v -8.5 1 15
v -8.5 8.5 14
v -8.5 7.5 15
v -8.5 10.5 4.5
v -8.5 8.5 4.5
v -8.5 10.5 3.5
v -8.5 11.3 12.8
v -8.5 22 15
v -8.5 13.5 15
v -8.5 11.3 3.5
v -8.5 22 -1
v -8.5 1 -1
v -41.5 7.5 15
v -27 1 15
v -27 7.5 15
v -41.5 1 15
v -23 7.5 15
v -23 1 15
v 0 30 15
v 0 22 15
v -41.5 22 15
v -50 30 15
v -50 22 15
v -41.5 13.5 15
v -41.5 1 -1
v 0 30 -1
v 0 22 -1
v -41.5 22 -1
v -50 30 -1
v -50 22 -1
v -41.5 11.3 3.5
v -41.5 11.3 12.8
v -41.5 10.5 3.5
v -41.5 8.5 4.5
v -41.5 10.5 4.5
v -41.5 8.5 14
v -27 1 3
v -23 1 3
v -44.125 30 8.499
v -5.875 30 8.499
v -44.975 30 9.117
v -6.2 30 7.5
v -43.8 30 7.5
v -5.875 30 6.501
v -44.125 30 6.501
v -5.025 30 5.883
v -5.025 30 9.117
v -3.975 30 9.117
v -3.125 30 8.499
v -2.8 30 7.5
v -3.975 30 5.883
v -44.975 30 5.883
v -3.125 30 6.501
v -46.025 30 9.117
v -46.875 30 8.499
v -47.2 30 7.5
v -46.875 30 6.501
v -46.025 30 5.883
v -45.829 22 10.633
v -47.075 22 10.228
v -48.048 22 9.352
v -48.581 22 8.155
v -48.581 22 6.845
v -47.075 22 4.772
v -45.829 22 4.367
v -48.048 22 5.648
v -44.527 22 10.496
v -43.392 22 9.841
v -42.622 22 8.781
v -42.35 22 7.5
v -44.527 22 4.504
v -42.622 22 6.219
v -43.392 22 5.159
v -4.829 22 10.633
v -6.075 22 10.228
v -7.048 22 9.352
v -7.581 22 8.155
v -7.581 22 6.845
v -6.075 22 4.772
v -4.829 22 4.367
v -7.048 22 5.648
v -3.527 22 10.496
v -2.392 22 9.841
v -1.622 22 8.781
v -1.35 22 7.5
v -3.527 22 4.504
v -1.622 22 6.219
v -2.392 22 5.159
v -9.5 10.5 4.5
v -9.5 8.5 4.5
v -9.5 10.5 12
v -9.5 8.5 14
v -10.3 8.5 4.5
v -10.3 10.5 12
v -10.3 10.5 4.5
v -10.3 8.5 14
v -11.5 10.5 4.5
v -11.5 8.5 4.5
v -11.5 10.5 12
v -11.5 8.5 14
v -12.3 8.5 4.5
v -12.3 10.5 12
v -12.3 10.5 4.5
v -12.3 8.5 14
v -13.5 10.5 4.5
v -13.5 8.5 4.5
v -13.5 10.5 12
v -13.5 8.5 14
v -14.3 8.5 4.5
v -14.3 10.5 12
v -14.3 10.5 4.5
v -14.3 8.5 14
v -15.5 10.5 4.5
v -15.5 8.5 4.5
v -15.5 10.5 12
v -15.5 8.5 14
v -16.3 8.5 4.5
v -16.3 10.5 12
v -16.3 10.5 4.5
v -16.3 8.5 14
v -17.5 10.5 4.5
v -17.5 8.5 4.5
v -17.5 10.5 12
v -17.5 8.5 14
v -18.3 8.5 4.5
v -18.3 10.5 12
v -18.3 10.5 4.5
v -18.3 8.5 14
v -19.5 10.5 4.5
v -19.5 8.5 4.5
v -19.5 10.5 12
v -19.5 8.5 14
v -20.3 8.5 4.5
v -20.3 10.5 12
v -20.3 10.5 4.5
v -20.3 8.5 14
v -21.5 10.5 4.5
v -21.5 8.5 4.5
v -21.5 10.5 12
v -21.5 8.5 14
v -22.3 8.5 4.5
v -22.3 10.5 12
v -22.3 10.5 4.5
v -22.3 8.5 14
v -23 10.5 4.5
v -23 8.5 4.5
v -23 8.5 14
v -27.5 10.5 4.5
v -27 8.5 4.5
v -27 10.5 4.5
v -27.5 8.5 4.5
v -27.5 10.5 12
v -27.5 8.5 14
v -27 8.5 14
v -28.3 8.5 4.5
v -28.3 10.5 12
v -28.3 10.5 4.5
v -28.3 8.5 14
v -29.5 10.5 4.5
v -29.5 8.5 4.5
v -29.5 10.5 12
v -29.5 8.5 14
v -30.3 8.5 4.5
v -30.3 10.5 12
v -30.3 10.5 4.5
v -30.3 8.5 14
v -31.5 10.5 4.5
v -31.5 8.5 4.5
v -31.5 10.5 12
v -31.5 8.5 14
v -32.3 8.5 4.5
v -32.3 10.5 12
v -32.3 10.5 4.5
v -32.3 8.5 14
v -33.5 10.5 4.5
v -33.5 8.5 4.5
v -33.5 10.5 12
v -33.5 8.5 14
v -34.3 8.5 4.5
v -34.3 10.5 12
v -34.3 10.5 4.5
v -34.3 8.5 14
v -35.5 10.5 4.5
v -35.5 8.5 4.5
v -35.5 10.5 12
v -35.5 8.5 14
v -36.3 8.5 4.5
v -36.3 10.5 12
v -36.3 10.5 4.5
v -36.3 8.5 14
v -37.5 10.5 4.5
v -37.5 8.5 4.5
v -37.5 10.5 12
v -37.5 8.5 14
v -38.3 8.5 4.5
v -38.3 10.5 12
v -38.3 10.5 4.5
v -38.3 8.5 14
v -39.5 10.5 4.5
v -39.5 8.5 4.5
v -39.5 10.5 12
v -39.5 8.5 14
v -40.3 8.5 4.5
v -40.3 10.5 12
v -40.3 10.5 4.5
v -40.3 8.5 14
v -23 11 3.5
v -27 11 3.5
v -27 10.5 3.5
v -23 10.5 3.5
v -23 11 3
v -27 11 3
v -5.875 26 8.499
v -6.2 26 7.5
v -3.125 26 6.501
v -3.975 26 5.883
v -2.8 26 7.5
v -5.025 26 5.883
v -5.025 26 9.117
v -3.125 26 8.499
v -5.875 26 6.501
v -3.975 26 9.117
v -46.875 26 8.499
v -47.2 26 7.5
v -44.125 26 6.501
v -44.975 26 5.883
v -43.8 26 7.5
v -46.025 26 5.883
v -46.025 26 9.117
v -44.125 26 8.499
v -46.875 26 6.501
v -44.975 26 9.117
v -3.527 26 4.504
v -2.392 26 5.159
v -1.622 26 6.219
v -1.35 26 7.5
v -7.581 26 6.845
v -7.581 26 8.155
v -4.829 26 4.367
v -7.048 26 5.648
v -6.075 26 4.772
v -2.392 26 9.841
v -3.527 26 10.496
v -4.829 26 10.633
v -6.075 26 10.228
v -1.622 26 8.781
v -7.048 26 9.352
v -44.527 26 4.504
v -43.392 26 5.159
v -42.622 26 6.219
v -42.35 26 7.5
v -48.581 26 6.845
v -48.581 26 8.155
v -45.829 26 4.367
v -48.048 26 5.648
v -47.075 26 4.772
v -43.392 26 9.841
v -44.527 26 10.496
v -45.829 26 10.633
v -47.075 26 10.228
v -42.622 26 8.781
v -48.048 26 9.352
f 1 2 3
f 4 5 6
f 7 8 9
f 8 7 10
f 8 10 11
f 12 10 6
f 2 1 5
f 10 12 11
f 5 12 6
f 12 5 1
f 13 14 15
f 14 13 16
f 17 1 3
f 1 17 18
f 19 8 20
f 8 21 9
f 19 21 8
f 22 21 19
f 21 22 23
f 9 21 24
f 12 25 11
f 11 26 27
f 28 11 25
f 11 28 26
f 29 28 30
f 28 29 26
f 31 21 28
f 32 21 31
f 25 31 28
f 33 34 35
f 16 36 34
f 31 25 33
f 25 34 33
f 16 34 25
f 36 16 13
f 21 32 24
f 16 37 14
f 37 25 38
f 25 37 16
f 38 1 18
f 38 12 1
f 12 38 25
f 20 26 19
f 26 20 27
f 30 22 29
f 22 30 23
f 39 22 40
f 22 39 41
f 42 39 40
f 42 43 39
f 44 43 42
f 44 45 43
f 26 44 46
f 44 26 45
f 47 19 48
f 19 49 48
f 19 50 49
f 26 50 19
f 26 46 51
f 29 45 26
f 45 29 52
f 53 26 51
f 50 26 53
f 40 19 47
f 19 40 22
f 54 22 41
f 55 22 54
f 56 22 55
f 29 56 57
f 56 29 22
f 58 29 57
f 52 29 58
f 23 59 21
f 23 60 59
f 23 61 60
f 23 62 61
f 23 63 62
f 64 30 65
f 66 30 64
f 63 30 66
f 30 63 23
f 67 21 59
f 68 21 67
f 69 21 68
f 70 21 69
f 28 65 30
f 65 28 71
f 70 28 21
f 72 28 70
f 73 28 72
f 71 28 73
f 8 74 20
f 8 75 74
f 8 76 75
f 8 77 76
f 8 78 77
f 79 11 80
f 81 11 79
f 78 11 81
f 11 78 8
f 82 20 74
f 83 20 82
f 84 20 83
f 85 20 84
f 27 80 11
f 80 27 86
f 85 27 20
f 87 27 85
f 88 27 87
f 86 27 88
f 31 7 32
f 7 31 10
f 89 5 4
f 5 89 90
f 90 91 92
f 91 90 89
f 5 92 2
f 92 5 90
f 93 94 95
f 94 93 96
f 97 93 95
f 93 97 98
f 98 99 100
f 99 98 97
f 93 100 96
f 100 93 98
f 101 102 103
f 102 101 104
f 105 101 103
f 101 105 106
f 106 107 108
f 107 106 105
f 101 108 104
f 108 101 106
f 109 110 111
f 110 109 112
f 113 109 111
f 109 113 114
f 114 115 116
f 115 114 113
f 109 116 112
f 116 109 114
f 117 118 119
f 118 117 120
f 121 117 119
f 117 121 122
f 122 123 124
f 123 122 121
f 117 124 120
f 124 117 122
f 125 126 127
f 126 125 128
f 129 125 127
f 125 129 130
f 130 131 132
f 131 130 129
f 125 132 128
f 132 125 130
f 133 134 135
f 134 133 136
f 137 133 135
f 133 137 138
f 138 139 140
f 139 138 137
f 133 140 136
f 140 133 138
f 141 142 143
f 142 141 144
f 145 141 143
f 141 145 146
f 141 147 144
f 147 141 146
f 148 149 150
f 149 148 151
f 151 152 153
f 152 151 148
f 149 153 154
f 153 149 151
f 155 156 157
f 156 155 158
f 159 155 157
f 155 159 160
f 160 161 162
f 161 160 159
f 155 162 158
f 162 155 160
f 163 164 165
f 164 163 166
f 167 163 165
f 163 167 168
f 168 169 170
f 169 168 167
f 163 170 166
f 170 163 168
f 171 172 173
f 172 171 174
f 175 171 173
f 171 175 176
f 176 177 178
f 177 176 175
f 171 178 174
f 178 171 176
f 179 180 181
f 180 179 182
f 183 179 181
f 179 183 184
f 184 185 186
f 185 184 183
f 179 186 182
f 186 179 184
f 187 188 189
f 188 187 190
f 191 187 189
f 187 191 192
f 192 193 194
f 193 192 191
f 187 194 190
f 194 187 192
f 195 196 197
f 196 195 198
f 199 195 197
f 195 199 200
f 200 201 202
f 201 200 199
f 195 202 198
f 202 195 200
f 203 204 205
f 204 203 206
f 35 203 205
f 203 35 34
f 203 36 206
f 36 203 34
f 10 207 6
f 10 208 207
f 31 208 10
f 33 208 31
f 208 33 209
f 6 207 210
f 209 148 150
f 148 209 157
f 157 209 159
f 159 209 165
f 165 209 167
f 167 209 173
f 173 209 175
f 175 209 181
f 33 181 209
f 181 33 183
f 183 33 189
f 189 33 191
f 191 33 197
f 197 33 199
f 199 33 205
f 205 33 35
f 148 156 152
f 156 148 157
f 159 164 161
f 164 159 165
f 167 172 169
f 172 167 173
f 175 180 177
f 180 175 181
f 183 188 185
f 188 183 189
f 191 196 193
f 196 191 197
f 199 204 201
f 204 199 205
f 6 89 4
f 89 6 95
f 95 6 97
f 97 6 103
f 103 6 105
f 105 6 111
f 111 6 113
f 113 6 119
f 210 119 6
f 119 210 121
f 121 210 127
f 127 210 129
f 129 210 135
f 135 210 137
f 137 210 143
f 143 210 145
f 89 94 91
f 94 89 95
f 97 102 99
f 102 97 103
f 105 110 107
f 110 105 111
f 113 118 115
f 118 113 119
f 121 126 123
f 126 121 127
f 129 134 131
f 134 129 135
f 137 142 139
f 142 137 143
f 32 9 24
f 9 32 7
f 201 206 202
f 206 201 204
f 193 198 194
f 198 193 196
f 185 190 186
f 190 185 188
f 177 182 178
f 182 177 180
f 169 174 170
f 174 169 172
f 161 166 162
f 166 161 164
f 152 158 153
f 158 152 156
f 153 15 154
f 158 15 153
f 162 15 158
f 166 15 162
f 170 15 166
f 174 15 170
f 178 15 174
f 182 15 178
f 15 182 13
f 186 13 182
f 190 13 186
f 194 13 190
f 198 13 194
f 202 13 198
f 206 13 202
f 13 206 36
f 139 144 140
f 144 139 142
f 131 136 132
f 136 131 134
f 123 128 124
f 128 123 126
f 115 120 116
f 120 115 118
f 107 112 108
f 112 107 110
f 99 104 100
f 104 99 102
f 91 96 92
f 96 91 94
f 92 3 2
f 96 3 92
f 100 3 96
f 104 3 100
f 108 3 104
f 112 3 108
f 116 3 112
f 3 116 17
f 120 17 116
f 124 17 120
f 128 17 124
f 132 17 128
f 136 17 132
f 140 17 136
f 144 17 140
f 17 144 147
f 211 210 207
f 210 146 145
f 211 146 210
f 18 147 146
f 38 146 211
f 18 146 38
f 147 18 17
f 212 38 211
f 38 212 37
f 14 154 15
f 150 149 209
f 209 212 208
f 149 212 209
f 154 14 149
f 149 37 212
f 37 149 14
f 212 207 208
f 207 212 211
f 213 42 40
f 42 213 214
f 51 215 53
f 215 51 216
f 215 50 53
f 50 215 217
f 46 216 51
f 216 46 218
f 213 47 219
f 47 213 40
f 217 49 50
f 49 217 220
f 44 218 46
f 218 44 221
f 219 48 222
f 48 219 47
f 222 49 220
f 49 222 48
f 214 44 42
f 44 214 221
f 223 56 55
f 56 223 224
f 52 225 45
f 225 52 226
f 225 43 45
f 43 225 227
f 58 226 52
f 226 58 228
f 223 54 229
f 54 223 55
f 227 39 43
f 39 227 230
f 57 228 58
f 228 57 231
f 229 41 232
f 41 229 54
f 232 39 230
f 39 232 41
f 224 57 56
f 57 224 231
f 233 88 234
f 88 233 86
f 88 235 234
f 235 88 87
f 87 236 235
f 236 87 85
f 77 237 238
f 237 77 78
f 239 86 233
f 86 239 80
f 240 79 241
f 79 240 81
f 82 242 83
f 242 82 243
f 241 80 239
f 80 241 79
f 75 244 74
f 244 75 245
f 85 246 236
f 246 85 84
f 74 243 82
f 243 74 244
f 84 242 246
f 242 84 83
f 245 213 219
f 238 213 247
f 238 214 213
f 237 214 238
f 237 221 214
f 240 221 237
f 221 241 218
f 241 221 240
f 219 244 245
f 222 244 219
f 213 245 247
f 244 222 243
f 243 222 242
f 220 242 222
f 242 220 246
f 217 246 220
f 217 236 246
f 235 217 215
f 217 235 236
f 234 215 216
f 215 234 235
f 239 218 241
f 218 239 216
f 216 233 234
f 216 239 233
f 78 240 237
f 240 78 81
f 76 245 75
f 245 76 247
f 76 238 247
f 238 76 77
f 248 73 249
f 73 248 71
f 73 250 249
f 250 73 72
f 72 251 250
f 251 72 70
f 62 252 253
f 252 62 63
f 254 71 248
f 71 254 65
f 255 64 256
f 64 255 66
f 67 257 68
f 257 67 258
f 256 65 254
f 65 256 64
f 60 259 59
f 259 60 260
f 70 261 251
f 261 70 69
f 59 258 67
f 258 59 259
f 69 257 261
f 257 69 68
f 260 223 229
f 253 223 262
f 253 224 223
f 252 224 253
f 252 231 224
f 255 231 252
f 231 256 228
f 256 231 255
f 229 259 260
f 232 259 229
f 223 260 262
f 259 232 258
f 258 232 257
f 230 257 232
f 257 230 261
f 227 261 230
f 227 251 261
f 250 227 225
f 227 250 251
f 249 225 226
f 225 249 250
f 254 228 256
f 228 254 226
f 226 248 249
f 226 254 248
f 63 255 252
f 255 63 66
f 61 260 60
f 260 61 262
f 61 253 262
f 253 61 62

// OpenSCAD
// PRUSA iteration3
// Y belt holder
// GNU GPL v3
// Josef Průša <iam@josefprusa.cz> and contributors
// http://www.reprap.org/wiki/Prusa_Mendel
// http://prusamendel.org
// Modified by dviejo for prusa i3 'dual frame' mutation

belt_tooth_distance = 2;
belt_tooth_ratio = 0.8;

extraHeight = 4;


module belt_holder_base(beltOffset=0){
 translate([-33-8.5,0+beltOffset,-1]) cube([33,15,16]); 
 translate([-33-8.5,11,-1]) cube([33,15,16]);
 translate([-50,22,-1]) cube([50,4+extraHeight,16]);
}

module belt_holder_beltcut(beltOffset=0){
 position_tweak=0.5; //-0.2
 // Belt slit
 translate([-66,-0.5+10+beltOffset,belt_tooth_distance+1.5]) cube([67,0.8,15]);
 // Smooth insert cutout
 translate([-66,-0.5+10+beltOffset,12]) rotate([45,0,0]) cube([67,15,15]);
 // Individual teeth
 for ( i = [0 : 23] ){
   translate([0-i*belt_tooth_distance+position_tweak,-0.5+8+beltOffset,4.5]) 
     cube([belt_tooth_distance-belt_tooth_ratio,2.8,15]);
 }
 // Middle opening
 translate([-2-25,-1+beltOffset,3]) cube([4,11,15]);	
}

module belt_holder_holes(){
 translate([-4.5,0,7.5]) rotate([-90,0,0]) cylinder(h=50, r=1.7, $fn=10);
 translate([-45.5,0,7.5]) rotate([-90,0,0]) cylinder(h=50, r=1.7, $fn=10);
 
 //bolt caps
 translate([-4.5,0,7.5]) rotate([-90,0,0]) cylinder(h=22+extraHeight, r=3.15, $fn=15);
 translate([-45.5,0,7.5]) rotate([-90,0,0]) cylinder(h=22+extraHeight, r=3.15, $fn=15);
}

// Final part
module belt_holder(){
  off=1;
 difference(){
  belt_holder_base(beltOffset=off);
  belt_holder_beltcut(beltOffset=off);
  belt_holder_holes();
 }
}

belt_holder();
